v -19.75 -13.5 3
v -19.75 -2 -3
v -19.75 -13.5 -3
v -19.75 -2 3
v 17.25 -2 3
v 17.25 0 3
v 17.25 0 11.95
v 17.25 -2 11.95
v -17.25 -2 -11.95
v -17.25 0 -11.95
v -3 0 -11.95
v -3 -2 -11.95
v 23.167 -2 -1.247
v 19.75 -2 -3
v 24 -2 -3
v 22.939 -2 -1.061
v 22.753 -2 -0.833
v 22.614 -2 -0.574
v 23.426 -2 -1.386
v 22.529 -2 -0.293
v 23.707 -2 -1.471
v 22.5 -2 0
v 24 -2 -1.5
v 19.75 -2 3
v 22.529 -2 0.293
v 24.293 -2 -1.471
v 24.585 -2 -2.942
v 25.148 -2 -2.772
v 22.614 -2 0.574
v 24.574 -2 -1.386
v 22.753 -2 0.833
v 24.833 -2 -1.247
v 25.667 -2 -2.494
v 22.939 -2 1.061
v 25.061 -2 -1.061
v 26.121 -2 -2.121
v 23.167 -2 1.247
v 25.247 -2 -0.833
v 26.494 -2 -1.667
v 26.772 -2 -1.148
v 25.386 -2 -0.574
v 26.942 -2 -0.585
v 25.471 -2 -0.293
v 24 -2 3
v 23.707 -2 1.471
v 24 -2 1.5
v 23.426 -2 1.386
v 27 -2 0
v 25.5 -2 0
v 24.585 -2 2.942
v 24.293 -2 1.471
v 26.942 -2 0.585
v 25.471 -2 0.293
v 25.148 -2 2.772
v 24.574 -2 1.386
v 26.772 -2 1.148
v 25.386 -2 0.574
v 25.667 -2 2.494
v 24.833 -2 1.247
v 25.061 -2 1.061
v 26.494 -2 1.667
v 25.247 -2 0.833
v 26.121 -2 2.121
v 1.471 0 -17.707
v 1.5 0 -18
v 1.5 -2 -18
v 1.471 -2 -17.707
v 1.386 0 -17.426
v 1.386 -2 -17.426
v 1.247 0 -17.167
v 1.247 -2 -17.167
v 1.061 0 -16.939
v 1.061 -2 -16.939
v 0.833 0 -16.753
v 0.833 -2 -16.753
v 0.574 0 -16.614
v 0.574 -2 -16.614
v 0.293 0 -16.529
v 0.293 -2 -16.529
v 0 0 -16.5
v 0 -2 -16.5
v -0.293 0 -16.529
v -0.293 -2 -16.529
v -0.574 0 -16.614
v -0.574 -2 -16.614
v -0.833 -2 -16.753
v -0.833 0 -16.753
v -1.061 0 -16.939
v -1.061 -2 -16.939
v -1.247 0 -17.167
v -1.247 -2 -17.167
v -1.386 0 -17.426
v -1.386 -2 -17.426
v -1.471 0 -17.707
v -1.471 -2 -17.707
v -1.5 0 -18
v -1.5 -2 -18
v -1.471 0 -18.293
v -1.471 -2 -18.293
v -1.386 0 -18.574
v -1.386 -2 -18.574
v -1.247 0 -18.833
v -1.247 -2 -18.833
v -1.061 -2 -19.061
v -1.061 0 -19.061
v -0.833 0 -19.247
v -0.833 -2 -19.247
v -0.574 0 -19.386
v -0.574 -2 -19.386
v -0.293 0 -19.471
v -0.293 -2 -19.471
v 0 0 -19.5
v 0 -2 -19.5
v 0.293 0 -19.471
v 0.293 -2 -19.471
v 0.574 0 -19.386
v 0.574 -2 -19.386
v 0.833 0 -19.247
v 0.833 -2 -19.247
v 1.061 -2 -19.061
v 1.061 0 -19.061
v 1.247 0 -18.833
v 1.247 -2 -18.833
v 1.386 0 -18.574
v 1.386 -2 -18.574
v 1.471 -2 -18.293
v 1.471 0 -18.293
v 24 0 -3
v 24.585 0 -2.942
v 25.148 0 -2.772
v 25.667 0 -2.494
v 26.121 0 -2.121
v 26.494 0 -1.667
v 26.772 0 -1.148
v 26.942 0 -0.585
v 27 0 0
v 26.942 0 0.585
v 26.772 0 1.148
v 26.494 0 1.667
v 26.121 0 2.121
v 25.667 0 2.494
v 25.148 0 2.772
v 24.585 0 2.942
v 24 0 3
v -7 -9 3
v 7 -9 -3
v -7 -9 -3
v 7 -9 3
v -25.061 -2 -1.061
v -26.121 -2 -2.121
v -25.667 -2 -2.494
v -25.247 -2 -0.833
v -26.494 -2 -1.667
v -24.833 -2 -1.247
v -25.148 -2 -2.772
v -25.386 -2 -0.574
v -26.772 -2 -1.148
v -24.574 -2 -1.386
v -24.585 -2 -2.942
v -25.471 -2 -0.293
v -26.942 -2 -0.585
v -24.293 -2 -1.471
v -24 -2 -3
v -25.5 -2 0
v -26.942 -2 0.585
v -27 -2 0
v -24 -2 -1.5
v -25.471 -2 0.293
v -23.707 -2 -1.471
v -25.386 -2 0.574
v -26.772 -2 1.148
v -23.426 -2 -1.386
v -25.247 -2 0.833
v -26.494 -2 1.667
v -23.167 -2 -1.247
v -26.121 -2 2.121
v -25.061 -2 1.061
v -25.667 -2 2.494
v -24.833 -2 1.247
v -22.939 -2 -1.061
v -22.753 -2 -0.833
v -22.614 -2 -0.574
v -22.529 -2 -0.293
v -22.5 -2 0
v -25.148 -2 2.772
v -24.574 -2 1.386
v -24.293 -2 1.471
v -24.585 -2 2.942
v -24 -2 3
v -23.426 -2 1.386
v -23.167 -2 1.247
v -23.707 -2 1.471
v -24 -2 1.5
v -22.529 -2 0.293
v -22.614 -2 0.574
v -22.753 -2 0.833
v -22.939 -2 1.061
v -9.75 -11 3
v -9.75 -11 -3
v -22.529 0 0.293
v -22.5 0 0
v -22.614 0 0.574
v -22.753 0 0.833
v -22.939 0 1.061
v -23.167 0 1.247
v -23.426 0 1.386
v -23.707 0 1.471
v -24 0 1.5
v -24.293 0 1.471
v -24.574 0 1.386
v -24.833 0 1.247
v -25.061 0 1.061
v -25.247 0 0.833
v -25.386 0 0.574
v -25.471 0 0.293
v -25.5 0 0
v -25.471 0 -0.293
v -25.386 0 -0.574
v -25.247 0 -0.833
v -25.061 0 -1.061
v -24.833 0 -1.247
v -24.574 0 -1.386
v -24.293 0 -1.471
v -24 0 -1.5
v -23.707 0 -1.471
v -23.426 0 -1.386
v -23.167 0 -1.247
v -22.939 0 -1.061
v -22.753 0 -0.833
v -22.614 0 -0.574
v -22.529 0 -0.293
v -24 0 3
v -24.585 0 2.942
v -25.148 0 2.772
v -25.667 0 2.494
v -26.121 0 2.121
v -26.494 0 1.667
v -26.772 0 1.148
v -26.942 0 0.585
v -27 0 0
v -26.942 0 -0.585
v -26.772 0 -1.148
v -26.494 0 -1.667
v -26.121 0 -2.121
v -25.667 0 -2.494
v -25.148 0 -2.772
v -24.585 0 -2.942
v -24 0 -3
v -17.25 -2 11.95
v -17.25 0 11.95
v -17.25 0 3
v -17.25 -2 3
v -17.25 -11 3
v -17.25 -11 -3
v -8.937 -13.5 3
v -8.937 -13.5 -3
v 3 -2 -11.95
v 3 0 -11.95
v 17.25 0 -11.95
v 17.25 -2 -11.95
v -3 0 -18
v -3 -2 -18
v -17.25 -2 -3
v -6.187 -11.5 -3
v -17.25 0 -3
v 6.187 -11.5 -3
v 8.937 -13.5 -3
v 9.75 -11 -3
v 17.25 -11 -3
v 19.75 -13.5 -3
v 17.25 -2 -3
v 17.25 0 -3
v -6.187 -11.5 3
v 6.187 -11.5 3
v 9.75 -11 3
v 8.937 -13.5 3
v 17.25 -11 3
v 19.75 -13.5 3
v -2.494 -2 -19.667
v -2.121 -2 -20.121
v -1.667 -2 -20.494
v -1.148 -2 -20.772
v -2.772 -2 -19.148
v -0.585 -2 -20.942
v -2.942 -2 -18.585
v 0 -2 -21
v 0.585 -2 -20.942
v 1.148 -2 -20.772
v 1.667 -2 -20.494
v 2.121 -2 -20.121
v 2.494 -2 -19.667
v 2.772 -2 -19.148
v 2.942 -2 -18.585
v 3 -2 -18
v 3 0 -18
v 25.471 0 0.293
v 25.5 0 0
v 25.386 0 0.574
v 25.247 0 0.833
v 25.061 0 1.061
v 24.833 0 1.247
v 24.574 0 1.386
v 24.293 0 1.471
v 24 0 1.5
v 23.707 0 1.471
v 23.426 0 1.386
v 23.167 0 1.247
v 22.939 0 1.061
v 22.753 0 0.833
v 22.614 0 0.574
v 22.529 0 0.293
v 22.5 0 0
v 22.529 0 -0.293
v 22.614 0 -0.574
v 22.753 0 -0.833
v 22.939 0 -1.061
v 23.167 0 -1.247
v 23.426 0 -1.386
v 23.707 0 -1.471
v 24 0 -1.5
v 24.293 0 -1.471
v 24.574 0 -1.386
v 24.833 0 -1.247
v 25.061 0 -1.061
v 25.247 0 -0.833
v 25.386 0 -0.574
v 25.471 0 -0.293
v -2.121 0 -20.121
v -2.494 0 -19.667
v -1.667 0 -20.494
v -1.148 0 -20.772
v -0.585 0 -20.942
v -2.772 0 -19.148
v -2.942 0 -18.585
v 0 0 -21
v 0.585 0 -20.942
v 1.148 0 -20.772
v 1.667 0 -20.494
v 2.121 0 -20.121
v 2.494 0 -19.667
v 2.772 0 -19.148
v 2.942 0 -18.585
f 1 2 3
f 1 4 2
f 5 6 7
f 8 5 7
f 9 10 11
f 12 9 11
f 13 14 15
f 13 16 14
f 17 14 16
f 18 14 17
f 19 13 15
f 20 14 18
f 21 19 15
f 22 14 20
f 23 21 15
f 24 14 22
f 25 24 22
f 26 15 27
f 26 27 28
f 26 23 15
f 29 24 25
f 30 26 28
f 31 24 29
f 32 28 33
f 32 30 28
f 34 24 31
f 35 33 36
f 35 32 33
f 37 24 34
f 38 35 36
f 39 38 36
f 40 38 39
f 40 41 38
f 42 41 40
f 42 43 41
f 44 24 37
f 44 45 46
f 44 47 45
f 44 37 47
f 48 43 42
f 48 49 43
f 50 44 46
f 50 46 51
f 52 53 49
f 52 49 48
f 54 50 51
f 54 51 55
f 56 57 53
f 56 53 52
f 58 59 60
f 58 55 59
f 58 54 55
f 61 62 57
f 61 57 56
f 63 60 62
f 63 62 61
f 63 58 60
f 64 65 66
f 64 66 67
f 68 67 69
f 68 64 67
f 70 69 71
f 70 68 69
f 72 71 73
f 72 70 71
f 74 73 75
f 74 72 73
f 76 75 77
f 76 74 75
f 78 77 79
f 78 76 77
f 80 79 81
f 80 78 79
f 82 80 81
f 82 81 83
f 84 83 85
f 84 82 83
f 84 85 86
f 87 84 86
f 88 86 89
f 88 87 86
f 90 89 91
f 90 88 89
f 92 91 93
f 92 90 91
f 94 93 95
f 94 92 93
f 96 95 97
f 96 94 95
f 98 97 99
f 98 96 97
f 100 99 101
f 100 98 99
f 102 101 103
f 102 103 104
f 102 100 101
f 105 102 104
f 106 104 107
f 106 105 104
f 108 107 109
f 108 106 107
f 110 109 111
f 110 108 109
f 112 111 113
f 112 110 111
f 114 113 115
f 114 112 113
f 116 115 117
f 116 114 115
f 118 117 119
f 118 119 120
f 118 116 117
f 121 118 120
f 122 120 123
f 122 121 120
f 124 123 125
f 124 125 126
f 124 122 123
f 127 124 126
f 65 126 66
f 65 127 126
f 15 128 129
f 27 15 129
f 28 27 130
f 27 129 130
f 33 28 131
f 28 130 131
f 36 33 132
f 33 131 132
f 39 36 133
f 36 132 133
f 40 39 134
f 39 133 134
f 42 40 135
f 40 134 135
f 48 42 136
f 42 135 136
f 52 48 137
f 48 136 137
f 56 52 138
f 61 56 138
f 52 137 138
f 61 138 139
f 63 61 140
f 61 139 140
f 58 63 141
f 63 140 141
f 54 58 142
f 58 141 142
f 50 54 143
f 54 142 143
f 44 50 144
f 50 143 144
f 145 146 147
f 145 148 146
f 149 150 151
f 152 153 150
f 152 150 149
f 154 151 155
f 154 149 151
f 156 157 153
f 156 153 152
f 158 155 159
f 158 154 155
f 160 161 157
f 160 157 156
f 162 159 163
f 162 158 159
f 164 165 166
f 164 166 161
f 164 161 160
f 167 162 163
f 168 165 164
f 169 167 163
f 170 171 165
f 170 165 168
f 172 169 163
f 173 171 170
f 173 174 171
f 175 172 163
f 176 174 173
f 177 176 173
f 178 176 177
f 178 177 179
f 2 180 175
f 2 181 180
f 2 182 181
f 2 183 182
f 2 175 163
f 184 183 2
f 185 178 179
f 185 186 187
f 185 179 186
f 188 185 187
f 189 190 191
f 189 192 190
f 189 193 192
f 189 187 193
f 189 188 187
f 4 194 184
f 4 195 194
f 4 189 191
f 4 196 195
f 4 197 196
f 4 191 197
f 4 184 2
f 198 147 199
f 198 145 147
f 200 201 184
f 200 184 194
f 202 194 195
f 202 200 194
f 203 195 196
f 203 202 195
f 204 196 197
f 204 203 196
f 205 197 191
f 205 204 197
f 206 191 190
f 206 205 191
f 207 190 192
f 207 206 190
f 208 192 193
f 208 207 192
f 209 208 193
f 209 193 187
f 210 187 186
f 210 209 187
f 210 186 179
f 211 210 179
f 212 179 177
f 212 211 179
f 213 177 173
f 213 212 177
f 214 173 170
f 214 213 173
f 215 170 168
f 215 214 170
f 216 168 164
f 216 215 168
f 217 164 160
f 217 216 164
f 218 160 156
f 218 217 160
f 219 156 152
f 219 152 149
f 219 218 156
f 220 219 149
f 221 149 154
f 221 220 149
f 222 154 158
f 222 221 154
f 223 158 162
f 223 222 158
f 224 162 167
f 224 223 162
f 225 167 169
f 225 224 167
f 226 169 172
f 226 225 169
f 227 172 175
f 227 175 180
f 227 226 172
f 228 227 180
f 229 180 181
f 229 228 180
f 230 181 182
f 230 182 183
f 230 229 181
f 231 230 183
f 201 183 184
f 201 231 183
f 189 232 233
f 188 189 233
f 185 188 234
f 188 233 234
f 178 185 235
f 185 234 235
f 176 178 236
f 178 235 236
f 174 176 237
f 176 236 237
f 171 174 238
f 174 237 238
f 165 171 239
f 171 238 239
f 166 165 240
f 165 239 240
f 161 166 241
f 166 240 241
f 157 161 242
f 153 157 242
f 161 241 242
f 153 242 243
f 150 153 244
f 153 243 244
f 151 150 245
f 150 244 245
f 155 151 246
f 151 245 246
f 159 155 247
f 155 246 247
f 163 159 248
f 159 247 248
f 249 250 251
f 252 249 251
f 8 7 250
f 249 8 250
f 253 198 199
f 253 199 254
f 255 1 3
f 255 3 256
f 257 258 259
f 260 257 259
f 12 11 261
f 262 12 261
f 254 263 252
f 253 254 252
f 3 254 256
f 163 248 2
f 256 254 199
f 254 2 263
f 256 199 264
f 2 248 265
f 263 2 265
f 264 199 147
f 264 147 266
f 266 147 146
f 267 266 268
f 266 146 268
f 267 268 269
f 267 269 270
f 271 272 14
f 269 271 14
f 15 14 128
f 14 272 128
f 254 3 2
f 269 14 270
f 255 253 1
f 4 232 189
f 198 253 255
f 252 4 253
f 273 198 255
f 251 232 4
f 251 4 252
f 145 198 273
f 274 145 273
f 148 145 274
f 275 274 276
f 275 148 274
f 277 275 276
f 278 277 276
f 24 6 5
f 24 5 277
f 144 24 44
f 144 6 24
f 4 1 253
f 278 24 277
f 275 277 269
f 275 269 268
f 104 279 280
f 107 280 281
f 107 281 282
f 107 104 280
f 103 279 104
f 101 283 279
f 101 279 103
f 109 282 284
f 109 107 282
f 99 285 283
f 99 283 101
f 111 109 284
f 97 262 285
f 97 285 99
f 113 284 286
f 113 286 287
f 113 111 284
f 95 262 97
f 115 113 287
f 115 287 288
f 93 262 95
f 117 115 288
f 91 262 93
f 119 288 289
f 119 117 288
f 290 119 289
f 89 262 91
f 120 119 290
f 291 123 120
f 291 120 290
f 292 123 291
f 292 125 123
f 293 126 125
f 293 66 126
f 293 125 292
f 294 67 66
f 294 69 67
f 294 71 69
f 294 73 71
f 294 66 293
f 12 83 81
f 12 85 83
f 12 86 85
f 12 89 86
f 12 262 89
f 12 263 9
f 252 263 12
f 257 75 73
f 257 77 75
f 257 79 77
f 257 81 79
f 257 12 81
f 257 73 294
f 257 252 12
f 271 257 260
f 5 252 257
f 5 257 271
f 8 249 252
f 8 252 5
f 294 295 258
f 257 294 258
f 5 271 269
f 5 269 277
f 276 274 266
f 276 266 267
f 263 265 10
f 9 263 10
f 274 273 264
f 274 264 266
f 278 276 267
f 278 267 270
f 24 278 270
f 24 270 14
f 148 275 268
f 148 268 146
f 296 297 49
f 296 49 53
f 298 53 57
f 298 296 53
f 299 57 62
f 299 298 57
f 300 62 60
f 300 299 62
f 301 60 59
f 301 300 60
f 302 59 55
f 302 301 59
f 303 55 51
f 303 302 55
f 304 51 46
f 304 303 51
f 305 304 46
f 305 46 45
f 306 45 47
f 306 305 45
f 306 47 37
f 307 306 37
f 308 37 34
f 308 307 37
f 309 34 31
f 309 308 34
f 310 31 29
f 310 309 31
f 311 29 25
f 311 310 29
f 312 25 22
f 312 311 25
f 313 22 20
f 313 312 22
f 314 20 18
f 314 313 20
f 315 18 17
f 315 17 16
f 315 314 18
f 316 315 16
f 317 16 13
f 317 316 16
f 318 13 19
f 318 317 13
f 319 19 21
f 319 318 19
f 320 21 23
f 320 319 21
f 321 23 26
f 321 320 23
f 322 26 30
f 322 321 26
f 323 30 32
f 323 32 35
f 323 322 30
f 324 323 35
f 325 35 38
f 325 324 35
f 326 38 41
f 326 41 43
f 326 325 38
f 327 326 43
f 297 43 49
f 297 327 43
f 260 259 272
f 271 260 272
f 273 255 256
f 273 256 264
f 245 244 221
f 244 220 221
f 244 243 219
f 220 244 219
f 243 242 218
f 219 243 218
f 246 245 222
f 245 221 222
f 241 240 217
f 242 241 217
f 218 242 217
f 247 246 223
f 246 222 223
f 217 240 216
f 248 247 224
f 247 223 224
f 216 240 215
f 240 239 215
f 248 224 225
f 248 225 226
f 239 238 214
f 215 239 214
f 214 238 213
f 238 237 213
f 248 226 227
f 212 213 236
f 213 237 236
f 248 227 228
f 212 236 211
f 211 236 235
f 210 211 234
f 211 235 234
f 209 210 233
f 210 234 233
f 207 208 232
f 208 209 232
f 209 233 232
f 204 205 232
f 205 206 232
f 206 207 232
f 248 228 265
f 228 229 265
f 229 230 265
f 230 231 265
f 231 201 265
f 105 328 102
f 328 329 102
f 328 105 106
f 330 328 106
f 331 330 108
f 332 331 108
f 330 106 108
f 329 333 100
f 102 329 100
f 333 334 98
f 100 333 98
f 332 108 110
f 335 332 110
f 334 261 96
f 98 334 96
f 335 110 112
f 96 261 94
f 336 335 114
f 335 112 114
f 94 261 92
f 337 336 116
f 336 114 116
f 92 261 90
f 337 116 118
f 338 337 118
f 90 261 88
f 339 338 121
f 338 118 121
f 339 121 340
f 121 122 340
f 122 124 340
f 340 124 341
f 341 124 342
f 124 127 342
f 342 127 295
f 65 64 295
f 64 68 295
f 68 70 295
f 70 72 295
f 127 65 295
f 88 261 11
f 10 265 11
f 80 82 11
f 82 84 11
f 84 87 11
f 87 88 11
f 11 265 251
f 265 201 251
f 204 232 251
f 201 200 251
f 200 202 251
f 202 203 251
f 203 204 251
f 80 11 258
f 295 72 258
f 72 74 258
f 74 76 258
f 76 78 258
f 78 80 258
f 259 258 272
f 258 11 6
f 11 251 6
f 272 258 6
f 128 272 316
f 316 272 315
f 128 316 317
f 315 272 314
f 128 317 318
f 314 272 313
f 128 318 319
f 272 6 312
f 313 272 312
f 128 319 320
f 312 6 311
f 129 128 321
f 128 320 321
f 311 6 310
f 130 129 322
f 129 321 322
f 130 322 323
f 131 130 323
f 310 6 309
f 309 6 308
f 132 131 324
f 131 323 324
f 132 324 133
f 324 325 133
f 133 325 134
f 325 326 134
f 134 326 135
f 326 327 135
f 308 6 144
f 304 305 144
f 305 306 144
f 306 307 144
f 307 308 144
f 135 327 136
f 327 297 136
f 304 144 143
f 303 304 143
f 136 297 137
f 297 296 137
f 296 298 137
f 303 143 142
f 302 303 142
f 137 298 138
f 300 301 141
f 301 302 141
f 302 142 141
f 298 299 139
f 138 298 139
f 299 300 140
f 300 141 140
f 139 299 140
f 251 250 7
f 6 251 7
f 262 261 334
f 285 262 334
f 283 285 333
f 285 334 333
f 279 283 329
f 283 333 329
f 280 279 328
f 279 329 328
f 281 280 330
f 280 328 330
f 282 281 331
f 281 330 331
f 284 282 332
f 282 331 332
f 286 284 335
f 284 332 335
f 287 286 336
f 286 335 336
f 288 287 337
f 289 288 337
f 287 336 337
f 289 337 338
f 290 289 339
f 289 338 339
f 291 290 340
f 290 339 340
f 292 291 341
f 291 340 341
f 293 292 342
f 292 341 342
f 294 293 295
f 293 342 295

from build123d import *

# Parameters (mm, degrees)
F0_R     = 1.5
F1_DEPTH = 2
F2_W     = 2.5
F2_H     = 6
F3_DEPTH = 9
F5_DEPTH = 3


with BuildPart() as f1:
    # F0 (on Front) → F1 (new body)
    with BuildSketch(Plane.XZ):
        with BuildLine():
            Line((3, -11.95), (17.25, -11.95))
            Line((17.25, -11.95), (17.25, -3))
            Line((17.25, -3), (24, -3))
            ThreePointArc((24, -3), (27, 0), (24, 3))
            Line((24, 3), (17.25, 3))
            Line((17.25, 3), (17.25, 11.95))
            Line((17.25, 11.95), (-17.25, 11.95))
            Line((-17.25, 11.95), (-17.25, 3))
            Line((-17.25, 3), (-24, 3))
            ThreePointArc((-24, 3), (-27, 0), (-24, -3))
            Line((-24, -3), (-17.25, -3))
            Line((-17.25, -3), (-17.25, -11.95))
            Line((-17.25, -11.95), (-3, -11.95))
            Line((-3, -11.95), (-3, -18))
            ThreePointArc((-3, -18), (0, -21), (3, -18))
            Line((3, -18), (3, -11.95))
        make_face()
        with Locations((0, -18)):
            Circle(F0_R, mode=Mode.SUBTRACT)
        with Locations((-24, 0)):
            Circle(F0_R, mode=Mode.SUBTRACT)
        with Locations((24, 0)):
            Circle(F0_R, mode=Mode.SUBTRACT)
    extrude(amount=F1_DEPTH)

    # F2 (on face) → F3 (join)
    with BuildSketch(Plane.XZ.offset(2)):
        with Locations((-18.5, 0)):
            Rectangle(F2_W, F2_H)
        with Locations((18.5, 0)):
            Rectangle(F2_W, F2_H)
    extrude(amount=F3_DEPTH)

    # F4 (on Top) → F5 (join, symmetric)
    with BuildSketch(Plane.XY):
        Polygon((-9.75, -11), (-19.75, -11), (-19.75, -13.5), (-8.93704, -13.5), (-6.18704, -11.5), (0, -11.5), (6.18704, -11.5), (8.93704, -13.5), (19.75, -13.5), (19.75, -11), (9.75, -11), (7, -9), (0, -9), (-7, -9), align=None)
    extrude(amount=F5_DEPTH, both=True)


solid = f1.part
